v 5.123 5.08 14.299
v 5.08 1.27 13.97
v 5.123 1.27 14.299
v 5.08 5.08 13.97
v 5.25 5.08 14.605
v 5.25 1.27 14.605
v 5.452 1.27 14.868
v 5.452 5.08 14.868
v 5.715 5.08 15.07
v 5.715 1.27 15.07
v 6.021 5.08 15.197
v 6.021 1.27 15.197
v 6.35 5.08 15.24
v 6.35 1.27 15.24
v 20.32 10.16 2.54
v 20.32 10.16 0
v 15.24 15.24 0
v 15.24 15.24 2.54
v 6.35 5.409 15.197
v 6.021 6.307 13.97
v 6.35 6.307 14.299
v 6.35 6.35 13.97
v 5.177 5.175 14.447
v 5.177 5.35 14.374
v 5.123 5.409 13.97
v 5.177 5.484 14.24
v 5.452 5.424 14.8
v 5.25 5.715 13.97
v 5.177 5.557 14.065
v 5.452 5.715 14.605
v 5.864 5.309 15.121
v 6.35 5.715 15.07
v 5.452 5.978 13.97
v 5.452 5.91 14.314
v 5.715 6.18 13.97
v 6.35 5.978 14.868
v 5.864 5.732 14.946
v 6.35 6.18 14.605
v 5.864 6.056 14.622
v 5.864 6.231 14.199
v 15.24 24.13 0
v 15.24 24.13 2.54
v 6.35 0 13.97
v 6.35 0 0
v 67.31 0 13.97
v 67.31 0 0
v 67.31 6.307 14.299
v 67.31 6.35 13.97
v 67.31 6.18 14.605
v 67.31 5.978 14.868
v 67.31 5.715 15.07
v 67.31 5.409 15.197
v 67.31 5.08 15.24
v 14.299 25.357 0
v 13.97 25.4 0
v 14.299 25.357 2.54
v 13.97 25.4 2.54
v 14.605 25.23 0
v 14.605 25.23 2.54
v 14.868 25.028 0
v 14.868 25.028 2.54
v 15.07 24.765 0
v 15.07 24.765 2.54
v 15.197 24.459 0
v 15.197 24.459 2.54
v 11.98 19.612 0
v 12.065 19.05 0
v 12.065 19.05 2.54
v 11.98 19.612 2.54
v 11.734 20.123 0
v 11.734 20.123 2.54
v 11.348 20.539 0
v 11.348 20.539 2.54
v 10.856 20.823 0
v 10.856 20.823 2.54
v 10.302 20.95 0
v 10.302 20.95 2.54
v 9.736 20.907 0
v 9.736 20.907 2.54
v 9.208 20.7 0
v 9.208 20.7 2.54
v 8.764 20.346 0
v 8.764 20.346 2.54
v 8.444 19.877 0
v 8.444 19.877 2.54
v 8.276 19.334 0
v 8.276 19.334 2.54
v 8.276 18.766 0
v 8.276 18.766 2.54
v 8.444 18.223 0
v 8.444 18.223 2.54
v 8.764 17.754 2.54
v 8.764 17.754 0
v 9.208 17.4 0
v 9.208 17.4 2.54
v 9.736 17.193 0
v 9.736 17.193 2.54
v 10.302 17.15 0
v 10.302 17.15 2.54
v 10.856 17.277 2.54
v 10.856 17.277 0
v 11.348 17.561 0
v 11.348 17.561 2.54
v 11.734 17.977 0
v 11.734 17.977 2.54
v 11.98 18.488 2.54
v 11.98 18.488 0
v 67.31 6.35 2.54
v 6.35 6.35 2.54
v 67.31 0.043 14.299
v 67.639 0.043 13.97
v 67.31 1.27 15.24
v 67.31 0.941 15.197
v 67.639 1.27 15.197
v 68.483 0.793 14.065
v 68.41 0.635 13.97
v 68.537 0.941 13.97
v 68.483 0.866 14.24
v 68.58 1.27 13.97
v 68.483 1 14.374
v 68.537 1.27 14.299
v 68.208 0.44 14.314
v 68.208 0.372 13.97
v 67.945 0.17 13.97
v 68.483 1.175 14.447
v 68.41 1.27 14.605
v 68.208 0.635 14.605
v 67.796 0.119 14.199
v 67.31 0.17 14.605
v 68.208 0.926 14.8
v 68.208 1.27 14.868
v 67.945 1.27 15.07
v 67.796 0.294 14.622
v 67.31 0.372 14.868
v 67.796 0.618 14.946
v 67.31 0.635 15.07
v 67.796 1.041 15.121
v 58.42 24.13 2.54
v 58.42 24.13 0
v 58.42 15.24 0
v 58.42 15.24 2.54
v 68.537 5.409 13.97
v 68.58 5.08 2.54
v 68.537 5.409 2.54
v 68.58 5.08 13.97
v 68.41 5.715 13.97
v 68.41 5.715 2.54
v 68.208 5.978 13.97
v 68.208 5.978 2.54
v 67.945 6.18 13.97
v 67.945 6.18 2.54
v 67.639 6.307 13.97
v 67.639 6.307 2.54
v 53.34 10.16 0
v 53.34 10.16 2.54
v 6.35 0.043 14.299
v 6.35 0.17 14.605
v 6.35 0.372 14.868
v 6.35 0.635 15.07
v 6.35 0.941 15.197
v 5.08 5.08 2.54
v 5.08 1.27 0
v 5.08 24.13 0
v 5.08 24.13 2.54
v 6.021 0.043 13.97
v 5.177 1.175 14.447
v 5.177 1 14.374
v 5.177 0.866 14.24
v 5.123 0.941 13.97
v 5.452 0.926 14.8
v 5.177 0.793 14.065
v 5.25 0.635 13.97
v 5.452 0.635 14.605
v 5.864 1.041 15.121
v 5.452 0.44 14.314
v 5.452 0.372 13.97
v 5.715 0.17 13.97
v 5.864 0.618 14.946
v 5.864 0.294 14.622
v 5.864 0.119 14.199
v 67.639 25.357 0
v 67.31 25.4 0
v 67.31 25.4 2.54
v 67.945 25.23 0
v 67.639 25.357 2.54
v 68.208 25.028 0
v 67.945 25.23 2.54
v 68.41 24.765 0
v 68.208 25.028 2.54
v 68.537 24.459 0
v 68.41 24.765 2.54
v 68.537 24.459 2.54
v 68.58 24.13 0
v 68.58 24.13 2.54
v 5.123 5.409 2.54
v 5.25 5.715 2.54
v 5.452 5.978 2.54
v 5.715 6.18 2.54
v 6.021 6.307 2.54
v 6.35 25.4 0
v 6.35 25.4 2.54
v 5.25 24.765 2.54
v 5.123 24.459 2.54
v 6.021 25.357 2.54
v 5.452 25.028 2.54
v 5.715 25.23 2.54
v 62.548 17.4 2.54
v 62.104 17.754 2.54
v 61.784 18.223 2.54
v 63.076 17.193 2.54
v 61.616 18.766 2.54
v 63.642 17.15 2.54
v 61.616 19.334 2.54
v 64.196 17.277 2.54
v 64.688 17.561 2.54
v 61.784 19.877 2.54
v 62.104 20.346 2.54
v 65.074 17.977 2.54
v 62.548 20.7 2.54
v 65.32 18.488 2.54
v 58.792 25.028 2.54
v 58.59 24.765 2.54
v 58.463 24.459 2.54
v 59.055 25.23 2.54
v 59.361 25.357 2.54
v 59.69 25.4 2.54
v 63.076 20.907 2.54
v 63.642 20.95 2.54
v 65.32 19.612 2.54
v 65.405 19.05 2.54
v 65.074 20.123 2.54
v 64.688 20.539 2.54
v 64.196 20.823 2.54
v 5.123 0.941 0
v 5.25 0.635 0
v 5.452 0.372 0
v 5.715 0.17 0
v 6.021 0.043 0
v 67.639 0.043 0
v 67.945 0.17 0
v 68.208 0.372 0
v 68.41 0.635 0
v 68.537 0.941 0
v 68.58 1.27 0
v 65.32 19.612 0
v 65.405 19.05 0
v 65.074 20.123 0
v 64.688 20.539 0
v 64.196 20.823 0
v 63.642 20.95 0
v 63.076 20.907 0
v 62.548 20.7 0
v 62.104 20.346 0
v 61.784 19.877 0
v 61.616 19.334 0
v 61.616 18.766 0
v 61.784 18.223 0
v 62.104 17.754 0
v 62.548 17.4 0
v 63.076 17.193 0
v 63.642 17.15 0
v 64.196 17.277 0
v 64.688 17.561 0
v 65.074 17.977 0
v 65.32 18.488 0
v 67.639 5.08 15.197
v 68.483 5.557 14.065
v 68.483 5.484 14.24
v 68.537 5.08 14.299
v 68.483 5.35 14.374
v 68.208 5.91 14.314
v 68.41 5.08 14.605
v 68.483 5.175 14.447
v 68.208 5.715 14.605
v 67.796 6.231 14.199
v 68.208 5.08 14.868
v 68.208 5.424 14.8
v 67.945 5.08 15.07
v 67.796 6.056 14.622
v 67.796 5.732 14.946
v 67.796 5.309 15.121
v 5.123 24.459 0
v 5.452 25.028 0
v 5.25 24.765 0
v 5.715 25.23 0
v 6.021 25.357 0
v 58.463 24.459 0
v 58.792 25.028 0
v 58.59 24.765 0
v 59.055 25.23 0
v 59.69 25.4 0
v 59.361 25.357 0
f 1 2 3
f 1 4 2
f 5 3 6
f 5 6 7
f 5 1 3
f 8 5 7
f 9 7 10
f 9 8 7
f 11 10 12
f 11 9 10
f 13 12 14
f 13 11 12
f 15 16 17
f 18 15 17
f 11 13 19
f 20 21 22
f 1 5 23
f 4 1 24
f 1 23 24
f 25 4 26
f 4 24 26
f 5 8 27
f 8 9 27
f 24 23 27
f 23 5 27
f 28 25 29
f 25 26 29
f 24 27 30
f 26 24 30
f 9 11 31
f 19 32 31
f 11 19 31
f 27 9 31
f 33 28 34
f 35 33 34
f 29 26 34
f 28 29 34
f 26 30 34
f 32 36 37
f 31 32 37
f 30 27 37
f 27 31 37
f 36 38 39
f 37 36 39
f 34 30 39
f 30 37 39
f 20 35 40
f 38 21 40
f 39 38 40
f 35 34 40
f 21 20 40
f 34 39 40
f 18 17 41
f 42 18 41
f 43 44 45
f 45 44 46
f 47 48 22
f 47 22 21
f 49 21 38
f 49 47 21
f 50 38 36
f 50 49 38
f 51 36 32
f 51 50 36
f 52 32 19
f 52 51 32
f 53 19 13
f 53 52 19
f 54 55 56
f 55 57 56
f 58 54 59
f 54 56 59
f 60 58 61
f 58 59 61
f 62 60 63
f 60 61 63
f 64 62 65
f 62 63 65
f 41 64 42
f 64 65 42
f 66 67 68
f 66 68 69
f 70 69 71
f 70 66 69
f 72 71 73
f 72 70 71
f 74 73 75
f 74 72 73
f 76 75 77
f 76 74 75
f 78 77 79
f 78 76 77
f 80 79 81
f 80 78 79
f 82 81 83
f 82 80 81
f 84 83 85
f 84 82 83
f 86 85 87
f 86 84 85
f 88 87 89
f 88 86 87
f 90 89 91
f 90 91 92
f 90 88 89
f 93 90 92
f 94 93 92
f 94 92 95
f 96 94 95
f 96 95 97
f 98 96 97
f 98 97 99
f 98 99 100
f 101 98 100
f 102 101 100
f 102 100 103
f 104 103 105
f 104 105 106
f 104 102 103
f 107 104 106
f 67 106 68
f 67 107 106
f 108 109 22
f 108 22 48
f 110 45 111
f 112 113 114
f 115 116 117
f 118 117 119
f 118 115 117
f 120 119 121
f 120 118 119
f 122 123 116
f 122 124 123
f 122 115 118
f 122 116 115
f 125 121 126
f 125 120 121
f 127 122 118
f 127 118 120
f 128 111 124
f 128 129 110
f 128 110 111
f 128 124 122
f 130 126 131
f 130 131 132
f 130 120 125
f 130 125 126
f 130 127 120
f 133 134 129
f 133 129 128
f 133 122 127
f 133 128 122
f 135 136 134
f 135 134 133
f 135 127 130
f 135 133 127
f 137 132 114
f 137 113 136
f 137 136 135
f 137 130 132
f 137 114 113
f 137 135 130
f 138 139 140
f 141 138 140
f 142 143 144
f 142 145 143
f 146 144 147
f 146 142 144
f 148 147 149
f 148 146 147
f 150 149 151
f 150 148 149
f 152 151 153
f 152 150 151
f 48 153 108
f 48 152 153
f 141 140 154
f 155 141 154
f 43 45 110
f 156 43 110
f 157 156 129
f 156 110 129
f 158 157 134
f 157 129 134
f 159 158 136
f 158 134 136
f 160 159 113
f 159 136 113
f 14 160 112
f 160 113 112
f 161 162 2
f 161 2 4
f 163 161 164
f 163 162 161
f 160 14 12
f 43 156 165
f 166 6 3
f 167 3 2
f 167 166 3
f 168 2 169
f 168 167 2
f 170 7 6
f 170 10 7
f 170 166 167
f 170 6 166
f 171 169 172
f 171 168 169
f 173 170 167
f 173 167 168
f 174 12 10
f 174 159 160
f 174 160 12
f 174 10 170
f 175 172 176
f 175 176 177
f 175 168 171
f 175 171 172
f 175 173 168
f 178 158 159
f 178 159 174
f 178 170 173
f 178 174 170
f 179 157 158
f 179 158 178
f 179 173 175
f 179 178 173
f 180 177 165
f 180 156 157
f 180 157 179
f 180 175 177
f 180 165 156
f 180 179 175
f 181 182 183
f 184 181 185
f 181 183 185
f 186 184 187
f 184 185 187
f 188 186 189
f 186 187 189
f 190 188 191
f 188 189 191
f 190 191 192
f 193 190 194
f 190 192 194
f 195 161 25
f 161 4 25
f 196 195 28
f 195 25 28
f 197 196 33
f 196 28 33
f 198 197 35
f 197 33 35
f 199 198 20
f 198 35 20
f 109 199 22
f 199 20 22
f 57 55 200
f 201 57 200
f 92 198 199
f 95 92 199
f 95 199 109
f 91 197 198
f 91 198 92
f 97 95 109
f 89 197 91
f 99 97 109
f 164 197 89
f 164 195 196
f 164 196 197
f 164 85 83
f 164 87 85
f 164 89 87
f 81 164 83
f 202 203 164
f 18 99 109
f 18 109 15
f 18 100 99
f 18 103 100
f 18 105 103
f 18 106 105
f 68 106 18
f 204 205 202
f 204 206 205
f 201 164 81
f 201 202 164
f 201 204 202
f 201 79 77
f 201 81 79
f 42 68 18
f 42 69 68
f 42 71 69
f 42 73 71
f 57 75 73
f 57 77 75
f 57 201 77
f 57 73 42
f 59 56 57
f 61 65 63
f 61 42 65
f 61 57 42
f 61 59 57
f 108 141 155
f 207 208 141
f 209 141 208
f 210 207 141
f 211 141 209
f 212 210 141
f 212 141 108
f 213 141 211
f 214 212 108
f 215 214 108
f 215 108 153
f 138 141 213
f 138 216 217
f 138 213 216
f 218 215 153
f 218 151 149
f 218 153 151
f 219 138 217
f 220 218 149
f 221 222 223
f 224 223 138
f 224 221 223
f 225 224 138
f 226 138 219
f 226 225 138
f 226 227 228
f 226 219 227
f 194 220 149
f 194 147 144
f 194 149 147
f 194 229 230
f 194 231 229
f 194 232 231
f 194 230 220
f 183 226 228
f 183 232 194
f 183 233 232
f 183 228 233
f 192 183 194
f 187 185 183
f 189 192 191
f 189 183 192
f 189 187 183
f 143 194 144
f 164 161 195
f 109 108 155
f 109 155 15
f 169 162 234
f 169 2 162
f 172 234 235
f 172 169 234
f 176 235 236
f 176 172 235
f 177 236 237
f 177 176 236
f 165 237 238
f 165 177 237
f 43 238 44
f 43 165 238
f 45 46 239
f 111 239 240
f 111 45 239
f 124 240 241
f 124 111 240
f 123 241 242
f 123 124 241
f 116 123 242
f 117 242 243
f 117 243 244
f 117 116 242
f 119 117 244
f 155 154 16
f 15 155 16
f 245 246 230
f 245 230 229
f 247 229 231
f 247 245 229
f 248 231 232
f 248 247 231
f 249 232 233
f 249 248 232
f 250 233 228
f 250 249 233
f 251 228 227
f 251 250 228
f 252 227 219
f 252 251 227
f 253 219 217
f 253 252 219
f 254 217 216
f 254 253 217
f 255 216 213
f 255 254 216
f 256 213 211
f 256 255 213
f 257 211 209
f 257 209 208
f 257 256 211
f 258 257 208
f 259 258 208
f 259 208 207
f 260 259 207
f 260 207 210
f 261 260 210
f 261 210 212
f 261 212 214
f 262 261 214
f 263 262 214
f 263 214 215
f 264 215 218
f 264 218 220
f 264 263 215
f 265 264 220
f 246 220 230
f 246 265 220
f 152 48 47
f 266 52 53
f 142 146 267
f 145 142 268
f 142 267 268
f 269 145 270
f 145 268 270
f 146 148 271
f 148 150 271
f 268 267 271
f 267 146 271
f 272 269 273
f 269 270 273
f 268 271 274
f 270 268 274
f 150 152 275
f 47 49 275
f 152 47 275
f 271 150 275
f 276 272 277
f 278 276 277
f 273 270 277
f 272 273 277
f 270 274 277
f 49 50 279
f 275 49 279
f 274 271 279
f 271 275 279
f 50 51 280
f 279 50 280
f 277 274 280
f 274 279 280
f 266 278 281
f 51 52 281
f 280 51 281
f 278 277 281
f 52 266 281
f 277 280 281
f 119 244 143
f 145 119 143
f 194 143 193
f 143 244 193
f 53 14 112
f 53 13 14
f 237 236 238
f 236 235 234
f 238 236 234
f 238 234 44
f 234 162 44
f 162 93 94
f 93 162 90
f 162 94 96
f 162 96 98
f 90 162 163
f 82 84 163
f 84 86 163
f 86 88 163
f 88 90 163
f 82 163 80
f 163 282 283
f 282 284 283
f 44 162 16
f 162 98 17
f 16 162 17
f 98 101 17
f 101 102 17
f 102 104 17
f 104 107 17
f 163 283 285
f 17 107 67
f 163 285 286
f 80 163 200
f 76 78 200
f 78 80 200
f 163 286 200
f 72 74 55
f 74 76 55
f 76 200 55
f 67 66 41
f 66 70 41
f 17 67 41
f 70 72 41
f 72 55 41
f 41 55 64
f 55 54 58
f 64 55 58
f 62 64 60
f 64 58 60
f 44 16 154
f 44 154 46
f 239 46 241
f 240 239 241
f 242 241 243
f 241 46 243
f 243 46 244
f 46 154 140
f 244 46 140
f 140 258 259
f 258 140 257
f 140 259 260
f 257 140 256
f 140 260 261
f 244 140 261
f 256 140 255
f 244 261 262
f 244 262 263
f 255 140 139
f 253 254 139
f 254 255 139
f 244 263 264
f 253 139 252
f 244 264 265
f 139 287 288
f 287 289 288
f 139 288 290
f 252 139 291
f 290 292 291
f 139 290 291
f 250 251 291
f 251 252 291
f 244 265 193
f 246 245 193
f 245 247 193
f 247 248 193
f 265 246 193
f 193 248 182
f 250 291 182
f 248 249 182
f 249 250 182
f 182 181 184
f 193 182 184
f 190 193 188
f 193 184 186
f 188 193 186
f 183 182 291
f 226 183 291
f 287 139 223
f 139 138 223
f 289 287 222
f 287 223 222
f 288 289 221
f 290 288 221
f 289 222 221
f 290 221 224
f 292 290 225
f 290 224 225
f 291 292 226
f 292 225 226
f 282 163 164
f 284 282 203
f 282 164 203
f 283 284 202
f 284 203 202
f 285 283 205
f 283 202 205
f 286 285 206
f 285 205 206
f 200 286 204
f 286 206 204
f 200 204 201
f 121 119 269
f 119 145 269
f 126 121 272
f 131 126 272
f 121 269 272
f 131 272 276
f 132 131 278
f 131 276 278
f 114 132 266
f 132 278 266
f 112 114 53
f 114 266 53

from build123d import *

# Parameters (mm, degrees)
F0_R     = 1.905
F1_DEPTH = 2.54
F2_W     = 63.5
F2_H     = 6.35
F3_DEPTH = 12.7
F4_R     = 1.27
F5_R     = 1.27


with BuildPart() as f1:
    # F0 (on Top) → F1 (new body)
    with BuildSketch(Plane.XY):
        Polygon((5.08, 25.4), (5.08, 0), (68.58, 0), (68.58, 25.4), (58.42, 25.4), (58.42, 15.24), (53.34, 10.16), (20.32, 10.16), (15.24, 15.24), (15.24, 25.4), align=None)
        with Locations((10.16, 19.05)):
            Circle(F0_R, mode=Mode.SUBTRACT)
        with Locations((63.5, 19.05)):
            Circle(F0_R, mode=Mode.SUBTRACT)
    extrude(amount=F1_DEPTH)

    # F2 (on face) → F3 (join)
    with BuildSketch(Plane.XY.offset(2.54)):
        with Locations((36.83, 3.175)):
            Rectangle(F2_W, F2_H)
    extrude(amount=F3_DEPTH)

    # F4
    f4_edges = [f1.edges().sort_by_distance(p)[0] for p in [
        (36.83, 0, 15.24),
        (36.83, 6.35, 15.24),
        (68.58, 0, 7.62),
        (68.58, 6.35, 8.89),
        (68.58, 3.175, 15.24),
        (5.08, 3.175, 15.24),
        (5.08, 0, 7.62),
        (5.08, 6.35, 8.89),
    ]]
    fillet(f4_edges, radius=F4_R)

    # F5
    f5_edges = [f1.edges().sort_by_distance(p)[0] for p in [
        (68.58, 25.4, 1.27),
        (58.42, 25.4, 1.27),
        (15.24, 25.4, 1.27),
        (5.08, 25.4, 1.27),
    ]]
    fillet(f5_edges, radius=F5_R)


solid = f1.part
